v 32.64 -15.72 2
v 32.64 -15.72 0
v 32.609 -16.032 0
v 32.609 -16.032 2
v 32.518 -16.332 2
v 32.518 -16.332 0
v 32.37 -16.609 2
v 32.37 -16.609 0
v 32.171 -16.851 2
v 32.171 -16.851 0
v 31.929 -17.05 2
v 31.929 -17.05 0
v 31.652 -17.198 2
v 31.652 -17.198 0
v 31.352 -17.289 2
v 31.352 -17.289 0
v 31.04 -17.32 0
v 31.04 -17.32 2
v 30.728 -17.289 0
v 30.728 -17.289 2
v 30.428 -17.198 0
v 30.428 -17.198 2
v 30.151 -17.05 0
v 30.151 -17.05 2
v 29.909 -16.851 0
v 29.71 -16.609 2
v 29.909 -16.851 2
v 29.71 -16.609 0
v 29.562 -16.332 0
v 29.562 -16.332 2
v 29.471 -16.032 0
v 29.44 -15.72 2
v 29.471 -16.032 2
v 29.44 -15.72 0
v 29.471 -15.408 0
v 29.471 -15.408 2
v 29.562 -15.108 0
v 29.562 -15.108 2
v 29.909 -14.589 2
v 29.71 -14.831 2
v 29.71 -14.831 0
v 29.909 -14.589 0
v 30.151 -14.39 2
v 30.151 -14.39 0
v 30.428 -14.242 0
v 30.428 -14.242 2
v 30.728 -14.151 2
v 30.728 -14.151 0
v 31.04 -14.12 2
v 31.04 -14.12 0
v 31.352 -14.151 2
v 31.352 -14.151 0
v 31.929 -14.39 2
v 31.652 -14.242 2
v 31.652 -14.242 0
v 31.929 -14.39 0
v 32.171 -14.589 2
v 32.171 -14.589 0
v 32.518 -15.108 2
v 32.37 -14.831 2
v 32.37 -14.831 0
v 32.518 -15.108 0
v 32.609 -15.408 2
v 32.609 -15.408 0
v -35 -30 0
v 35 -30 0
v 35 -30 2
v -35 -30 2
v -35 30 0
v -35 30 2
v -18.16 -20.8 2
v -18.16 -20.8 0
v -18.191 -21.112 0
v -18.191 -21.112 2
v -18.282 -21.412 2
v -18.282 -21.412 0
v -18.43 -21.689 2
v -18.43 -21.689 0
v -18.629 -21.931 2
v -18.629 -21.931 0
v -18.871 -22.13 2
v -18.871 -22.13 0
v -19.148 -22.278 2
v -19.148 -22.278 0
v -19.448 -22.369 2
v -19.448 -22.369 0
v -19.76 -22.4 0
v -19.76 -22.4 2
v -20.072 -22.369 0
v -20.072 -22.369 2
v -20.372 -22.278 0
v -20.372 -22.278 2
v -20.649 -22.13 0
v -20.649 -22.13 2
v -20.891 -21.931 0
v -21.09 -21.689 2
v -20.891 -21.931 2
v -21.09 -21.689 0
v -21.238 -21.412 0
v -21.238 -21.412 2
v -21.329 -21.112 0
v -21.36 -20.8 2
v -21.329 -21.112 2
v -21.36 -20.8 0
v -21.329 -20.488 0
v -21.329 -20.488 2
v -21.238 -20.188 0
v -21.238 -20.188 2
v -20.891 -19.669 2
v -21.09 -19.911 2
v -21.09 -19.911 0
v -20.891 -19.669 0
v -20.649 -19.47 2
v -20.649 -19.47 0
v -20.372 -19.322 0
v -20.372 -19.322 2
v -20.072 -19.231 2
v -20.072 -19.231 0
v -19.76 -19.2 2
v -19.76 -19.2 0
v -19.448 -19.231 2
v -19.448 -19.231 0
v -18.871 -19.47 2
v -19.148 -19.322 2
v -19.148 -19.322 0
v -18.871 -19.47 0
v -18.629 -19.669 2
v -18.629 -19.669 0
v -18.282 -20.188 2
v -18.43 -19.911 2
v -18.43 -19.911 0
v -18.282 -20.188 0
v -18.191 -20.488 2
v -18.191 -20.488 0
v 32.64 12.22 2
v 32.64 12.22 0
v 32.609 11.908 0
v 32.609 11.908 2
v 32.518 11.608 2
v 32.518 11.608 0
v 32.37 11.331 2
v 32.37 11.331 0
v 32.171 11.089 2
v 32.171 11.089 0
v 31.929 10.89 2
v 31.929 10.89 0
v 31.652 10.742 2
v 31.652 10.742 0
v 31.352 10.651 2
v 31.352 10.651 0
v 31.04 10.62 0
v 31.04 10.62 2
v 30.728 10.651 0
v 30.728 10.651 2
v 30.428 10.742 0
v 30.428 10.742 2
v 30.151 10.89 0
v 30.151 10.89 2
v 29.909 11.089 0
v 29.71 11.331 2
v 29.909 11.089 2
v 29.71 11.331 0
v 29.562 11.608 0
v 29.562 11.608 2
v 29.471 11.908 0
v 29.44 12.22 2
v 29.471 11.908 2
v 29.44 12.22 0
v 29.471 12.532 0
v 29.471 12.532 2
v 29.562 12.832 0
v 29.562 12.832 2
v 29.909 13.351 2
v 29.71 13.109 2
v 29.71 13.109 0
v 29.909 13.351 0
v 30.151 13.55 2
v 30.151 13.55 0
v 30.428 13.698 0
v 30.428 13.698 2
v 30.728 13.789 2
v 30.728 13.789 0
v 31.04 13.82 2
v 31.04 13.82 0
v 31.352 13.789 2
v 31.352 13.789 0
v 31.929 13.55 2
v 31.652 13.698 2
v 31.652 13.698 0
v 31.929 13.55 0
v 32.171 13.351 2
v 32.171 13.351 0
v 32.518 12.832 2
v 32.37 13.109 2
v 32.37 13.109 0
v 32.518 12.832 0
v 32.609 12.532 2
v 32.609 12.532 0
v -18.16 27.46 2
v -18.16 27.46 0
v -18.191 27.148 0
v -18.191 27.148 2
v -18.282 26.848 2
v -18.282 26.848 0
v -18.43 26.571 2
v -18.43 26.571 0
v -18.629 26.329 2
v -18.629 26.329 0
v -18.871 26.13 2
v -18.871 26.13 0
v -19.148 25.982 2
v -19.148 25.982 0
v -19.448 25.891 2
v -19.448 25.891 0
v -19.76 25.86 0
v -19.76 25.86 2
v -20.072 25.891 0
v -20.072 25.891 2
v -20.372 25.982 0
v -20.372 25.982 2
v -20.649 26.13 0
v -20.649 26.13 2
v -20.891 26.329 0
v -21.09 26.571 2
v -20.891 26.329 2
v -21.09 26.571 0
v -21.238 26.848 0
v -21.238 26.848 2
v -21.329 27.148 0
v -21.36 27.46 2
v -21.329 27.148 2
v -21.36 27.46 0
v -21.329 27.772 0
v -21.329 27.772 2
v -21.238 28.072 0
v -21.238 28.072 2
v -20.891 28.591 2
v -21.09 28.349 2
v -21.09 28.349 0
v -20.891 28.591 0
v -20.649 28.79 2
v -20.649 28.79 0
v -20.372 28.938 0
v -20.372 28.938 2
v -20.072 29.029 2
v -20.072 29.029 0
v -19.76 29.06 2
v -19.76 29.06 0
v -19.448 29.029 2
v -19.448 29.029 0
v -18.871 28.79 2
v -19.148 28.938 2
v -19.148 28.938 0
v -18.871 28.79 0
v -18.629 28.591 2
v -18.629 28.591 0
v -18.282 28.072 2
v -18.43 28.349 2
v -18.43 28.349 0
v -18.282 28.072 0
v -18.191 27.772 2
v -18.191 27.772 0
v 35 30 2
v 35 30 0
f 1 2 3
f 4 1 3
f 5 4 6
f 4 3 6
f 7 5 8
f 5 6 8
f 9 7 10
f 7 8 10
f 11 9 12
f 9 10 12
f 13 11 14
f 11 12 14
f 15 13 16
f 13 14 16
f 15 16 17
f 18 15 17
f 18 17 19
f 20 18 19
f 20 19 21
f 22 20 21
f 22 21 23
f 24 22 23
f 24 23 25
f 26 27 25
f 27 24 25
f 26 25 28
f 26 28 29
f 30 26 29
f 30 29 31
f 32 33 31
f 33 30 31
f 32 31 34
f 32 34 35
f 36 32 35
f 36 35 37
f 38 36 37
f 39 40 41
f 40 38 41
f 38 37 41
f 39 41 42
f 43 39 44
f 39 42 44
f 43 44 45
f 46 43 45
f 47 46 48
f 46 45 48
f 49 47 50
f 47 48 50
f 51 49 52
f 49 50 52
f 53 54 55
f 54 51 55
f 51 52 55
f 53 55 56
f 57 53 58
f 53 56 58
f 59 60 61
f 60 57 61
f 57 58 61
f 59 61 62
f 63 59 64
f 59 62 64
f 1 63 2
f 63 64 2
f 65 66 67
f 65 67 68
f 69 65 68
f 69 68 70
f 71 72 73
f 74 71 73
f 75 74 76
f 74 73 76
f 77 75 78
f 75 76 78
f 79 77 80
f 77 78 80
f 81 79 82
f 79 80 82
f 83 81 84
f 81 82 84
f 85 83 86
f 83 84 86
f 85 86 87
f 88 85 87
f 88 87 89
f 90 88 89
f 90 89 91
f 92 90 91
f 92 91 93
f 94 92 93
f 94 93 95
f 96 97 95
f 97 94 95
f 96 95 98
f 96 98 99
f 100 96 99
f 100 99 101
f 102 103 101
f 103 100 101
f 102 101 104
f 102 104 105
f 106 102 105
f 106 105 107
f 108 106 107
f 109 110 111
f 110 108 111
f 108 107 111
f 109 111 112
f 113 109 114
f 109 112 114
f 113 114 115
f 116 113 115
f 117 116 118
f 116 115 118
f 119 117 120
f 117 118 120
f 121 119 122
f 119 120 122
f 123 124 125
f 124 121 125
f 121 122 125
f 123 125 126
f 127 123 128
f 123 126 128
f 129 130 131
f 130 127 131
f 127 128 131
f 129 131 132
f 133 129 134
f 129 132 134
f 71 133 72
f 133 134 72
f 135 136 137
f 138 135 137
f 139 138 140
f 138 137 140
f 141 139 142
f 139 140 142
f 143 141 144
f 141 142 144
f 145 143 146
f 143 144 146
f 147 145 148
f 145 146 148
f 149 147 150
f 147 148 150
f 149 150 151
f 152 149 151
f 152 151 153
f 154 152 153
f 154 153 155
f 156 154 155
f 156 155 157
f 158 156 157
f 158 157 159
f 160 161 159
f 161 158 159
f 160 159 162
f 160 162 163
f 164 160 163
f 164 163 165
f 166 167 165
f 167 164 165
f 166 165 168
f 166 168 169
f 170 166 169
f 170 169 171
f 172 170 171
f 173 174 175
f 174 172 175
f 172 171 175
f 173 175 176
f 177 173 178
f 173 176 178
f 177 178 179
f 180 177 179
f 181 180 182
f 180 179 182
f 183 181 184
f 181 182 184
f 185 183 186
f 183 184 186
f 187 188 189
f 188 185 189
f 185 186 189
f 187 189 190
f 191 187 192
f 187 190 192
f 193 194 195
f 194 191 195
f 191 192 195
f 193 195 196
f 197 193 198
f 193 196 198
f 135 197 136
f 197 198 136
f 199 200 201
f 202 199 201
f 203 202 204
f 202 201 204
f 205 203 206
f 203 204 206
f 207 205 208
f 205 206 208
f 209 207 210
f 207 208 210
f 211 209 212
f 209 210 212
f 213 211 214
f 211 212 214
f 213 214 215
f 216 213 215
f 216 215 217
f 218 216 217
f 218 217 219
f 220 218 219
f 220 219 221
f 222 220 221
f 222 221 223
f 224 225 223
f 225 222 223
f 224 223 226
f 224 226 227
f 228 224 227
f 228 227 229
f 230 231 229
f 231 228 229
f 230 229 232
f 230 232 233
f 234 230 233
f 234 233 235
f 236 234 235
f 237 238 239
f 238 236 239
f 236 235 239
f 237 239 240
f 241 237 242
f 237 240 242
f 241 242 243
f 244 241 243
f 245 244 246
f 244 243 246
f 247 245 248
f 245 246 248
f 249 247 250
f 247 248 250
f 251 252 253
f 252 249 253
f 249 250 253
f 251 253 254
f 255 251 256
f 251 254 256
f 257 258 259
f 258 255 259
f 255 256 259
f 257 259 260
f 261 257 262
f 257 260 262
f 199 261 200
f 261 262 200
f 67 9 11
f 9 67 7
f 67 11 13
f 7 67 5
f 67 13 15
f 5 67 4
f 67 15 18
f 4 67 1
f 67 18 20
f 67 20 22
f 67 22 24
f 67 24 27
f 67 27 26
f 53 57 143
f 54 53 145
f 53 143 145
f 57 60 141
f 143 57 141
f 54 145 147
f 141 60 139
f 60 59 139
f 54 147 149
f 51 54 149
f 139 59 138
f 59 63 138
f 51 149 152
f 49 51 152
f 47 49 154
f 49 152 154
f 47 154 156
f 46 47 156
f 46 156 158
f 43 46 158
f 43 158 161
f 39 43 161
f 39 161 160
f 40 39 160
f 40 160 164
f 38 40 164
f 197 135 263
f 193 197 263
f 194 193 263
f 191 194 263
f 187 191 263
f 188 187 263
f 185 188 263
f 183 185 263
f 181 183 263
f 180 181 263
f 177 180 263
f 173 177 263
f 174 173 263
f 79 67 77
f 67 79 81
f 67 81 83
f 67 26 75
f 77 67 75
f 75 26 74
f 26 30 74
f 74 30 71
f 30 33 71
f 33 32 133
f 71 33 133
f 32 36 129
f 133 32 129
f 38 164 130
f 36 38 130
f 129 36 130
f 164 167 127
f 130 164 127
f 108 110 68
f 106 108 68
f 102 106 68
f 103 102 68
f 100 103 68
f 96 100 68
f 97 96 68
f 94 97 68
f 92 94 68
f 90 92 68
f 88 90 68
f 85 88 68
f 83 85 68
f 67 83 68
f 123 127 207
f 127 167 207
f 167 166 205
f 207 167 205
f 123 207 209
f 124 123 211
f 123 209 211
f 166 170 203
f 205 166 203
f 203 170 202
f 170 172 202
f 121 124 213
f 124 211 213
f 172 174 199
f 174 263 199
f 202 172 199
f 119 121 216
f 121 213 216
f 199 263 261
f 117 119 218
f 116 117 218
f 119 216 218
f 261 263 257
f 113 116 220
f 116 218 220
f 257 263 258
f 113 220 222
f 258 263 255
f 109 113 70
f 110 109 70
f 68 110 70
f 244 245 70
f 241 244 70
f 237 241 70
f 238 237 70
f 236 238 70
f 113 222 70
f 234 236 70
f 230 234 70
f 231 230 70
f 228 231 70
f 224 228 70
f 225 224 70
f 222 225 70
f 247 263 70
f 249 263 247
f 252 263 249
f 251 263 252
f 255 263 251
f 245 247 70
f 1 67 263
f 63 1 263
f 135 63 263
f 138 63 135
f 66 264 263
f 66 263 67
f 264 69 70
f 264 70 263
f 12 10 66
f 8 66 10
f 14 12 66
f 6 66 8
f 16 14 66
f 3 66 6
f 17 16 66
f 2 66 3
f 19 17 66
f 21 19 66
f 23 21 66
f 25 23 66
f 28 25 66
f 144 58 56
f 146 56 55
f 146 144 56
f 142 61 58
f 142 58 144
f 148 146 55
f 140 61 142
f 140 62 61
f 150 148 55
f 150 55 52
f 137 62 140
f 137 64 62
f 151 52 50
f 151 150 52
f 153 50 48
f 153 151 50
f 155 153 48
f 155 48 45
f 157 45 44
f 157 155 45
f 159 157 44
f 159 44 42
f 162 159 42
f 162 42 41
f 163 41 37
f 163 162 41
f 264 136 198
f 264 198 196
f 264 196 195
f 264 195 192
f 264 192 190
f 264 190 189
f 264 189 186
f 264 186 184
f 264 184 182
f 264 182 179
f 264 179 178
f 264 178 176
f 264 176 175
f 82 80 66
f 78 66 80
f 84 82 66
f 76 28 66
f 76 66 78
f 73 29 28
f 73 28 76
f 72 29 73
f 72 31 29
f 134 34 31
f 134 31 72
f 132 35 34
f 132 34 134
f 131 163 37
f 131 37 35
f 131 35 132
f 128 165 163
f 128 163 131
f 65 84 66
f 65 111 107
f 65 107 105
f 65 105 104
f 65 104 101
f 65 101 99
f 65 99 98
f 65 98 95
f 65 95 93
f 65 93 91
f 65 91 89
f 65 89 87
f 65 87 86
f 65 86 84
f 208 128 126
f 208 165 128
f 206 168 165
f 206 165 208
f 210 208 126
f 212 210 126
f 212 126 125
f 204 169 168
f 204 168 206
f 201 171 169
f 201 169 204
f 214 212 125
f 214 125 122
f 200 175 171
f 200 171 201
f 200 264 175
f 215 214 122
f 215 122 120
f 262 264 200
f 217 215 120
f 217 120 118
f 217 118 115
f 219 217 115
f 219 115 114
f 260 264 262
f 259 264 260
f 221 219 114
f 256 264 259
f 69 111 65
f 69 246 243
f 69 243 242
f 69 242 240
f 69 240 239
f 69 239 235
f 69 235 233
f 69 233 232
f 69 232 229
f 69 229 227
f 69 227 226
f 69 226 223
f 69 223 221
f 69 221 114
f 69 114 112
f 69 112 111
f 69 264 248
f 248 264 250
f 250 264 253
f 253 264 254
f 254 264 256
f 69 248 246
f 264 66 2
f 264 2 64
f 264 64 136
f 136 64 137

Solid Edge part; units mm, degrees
sketch "Sketch1" plane through (0, 0, 0) normal (0, 0, 1) x (1, 0, 0)
  circle A0 centre (31.04, -15.72) radius 1.6
  circle A1 centre (-19.76, -20.8) radius 1.6
  line L0 (-35, -30) -> (-35, 30)
  line L1 (-35, 30) -> (35, 30)
  line L2 (35, 30) -> (35, -30)
  line L3 (35, -30) -> (-35, -30)
  circle A2 centre (31.04, 12.22) radius 1.6
  circle A3 centre (-19.76, 27.46) radius 1.6
  dimension "D1" = 70
  dimension "D2" = 60
  dimension "D3" = 66.04
  dimension "D4" = 17.78
  dimension "D5" = 45.72
  dimension "D6" = 50.8
  dimension "D7" = 2.54
  dimension "D8" = 15.24
extrude "Protrusion1" add sketch "Sketch1" along normal blind 2
